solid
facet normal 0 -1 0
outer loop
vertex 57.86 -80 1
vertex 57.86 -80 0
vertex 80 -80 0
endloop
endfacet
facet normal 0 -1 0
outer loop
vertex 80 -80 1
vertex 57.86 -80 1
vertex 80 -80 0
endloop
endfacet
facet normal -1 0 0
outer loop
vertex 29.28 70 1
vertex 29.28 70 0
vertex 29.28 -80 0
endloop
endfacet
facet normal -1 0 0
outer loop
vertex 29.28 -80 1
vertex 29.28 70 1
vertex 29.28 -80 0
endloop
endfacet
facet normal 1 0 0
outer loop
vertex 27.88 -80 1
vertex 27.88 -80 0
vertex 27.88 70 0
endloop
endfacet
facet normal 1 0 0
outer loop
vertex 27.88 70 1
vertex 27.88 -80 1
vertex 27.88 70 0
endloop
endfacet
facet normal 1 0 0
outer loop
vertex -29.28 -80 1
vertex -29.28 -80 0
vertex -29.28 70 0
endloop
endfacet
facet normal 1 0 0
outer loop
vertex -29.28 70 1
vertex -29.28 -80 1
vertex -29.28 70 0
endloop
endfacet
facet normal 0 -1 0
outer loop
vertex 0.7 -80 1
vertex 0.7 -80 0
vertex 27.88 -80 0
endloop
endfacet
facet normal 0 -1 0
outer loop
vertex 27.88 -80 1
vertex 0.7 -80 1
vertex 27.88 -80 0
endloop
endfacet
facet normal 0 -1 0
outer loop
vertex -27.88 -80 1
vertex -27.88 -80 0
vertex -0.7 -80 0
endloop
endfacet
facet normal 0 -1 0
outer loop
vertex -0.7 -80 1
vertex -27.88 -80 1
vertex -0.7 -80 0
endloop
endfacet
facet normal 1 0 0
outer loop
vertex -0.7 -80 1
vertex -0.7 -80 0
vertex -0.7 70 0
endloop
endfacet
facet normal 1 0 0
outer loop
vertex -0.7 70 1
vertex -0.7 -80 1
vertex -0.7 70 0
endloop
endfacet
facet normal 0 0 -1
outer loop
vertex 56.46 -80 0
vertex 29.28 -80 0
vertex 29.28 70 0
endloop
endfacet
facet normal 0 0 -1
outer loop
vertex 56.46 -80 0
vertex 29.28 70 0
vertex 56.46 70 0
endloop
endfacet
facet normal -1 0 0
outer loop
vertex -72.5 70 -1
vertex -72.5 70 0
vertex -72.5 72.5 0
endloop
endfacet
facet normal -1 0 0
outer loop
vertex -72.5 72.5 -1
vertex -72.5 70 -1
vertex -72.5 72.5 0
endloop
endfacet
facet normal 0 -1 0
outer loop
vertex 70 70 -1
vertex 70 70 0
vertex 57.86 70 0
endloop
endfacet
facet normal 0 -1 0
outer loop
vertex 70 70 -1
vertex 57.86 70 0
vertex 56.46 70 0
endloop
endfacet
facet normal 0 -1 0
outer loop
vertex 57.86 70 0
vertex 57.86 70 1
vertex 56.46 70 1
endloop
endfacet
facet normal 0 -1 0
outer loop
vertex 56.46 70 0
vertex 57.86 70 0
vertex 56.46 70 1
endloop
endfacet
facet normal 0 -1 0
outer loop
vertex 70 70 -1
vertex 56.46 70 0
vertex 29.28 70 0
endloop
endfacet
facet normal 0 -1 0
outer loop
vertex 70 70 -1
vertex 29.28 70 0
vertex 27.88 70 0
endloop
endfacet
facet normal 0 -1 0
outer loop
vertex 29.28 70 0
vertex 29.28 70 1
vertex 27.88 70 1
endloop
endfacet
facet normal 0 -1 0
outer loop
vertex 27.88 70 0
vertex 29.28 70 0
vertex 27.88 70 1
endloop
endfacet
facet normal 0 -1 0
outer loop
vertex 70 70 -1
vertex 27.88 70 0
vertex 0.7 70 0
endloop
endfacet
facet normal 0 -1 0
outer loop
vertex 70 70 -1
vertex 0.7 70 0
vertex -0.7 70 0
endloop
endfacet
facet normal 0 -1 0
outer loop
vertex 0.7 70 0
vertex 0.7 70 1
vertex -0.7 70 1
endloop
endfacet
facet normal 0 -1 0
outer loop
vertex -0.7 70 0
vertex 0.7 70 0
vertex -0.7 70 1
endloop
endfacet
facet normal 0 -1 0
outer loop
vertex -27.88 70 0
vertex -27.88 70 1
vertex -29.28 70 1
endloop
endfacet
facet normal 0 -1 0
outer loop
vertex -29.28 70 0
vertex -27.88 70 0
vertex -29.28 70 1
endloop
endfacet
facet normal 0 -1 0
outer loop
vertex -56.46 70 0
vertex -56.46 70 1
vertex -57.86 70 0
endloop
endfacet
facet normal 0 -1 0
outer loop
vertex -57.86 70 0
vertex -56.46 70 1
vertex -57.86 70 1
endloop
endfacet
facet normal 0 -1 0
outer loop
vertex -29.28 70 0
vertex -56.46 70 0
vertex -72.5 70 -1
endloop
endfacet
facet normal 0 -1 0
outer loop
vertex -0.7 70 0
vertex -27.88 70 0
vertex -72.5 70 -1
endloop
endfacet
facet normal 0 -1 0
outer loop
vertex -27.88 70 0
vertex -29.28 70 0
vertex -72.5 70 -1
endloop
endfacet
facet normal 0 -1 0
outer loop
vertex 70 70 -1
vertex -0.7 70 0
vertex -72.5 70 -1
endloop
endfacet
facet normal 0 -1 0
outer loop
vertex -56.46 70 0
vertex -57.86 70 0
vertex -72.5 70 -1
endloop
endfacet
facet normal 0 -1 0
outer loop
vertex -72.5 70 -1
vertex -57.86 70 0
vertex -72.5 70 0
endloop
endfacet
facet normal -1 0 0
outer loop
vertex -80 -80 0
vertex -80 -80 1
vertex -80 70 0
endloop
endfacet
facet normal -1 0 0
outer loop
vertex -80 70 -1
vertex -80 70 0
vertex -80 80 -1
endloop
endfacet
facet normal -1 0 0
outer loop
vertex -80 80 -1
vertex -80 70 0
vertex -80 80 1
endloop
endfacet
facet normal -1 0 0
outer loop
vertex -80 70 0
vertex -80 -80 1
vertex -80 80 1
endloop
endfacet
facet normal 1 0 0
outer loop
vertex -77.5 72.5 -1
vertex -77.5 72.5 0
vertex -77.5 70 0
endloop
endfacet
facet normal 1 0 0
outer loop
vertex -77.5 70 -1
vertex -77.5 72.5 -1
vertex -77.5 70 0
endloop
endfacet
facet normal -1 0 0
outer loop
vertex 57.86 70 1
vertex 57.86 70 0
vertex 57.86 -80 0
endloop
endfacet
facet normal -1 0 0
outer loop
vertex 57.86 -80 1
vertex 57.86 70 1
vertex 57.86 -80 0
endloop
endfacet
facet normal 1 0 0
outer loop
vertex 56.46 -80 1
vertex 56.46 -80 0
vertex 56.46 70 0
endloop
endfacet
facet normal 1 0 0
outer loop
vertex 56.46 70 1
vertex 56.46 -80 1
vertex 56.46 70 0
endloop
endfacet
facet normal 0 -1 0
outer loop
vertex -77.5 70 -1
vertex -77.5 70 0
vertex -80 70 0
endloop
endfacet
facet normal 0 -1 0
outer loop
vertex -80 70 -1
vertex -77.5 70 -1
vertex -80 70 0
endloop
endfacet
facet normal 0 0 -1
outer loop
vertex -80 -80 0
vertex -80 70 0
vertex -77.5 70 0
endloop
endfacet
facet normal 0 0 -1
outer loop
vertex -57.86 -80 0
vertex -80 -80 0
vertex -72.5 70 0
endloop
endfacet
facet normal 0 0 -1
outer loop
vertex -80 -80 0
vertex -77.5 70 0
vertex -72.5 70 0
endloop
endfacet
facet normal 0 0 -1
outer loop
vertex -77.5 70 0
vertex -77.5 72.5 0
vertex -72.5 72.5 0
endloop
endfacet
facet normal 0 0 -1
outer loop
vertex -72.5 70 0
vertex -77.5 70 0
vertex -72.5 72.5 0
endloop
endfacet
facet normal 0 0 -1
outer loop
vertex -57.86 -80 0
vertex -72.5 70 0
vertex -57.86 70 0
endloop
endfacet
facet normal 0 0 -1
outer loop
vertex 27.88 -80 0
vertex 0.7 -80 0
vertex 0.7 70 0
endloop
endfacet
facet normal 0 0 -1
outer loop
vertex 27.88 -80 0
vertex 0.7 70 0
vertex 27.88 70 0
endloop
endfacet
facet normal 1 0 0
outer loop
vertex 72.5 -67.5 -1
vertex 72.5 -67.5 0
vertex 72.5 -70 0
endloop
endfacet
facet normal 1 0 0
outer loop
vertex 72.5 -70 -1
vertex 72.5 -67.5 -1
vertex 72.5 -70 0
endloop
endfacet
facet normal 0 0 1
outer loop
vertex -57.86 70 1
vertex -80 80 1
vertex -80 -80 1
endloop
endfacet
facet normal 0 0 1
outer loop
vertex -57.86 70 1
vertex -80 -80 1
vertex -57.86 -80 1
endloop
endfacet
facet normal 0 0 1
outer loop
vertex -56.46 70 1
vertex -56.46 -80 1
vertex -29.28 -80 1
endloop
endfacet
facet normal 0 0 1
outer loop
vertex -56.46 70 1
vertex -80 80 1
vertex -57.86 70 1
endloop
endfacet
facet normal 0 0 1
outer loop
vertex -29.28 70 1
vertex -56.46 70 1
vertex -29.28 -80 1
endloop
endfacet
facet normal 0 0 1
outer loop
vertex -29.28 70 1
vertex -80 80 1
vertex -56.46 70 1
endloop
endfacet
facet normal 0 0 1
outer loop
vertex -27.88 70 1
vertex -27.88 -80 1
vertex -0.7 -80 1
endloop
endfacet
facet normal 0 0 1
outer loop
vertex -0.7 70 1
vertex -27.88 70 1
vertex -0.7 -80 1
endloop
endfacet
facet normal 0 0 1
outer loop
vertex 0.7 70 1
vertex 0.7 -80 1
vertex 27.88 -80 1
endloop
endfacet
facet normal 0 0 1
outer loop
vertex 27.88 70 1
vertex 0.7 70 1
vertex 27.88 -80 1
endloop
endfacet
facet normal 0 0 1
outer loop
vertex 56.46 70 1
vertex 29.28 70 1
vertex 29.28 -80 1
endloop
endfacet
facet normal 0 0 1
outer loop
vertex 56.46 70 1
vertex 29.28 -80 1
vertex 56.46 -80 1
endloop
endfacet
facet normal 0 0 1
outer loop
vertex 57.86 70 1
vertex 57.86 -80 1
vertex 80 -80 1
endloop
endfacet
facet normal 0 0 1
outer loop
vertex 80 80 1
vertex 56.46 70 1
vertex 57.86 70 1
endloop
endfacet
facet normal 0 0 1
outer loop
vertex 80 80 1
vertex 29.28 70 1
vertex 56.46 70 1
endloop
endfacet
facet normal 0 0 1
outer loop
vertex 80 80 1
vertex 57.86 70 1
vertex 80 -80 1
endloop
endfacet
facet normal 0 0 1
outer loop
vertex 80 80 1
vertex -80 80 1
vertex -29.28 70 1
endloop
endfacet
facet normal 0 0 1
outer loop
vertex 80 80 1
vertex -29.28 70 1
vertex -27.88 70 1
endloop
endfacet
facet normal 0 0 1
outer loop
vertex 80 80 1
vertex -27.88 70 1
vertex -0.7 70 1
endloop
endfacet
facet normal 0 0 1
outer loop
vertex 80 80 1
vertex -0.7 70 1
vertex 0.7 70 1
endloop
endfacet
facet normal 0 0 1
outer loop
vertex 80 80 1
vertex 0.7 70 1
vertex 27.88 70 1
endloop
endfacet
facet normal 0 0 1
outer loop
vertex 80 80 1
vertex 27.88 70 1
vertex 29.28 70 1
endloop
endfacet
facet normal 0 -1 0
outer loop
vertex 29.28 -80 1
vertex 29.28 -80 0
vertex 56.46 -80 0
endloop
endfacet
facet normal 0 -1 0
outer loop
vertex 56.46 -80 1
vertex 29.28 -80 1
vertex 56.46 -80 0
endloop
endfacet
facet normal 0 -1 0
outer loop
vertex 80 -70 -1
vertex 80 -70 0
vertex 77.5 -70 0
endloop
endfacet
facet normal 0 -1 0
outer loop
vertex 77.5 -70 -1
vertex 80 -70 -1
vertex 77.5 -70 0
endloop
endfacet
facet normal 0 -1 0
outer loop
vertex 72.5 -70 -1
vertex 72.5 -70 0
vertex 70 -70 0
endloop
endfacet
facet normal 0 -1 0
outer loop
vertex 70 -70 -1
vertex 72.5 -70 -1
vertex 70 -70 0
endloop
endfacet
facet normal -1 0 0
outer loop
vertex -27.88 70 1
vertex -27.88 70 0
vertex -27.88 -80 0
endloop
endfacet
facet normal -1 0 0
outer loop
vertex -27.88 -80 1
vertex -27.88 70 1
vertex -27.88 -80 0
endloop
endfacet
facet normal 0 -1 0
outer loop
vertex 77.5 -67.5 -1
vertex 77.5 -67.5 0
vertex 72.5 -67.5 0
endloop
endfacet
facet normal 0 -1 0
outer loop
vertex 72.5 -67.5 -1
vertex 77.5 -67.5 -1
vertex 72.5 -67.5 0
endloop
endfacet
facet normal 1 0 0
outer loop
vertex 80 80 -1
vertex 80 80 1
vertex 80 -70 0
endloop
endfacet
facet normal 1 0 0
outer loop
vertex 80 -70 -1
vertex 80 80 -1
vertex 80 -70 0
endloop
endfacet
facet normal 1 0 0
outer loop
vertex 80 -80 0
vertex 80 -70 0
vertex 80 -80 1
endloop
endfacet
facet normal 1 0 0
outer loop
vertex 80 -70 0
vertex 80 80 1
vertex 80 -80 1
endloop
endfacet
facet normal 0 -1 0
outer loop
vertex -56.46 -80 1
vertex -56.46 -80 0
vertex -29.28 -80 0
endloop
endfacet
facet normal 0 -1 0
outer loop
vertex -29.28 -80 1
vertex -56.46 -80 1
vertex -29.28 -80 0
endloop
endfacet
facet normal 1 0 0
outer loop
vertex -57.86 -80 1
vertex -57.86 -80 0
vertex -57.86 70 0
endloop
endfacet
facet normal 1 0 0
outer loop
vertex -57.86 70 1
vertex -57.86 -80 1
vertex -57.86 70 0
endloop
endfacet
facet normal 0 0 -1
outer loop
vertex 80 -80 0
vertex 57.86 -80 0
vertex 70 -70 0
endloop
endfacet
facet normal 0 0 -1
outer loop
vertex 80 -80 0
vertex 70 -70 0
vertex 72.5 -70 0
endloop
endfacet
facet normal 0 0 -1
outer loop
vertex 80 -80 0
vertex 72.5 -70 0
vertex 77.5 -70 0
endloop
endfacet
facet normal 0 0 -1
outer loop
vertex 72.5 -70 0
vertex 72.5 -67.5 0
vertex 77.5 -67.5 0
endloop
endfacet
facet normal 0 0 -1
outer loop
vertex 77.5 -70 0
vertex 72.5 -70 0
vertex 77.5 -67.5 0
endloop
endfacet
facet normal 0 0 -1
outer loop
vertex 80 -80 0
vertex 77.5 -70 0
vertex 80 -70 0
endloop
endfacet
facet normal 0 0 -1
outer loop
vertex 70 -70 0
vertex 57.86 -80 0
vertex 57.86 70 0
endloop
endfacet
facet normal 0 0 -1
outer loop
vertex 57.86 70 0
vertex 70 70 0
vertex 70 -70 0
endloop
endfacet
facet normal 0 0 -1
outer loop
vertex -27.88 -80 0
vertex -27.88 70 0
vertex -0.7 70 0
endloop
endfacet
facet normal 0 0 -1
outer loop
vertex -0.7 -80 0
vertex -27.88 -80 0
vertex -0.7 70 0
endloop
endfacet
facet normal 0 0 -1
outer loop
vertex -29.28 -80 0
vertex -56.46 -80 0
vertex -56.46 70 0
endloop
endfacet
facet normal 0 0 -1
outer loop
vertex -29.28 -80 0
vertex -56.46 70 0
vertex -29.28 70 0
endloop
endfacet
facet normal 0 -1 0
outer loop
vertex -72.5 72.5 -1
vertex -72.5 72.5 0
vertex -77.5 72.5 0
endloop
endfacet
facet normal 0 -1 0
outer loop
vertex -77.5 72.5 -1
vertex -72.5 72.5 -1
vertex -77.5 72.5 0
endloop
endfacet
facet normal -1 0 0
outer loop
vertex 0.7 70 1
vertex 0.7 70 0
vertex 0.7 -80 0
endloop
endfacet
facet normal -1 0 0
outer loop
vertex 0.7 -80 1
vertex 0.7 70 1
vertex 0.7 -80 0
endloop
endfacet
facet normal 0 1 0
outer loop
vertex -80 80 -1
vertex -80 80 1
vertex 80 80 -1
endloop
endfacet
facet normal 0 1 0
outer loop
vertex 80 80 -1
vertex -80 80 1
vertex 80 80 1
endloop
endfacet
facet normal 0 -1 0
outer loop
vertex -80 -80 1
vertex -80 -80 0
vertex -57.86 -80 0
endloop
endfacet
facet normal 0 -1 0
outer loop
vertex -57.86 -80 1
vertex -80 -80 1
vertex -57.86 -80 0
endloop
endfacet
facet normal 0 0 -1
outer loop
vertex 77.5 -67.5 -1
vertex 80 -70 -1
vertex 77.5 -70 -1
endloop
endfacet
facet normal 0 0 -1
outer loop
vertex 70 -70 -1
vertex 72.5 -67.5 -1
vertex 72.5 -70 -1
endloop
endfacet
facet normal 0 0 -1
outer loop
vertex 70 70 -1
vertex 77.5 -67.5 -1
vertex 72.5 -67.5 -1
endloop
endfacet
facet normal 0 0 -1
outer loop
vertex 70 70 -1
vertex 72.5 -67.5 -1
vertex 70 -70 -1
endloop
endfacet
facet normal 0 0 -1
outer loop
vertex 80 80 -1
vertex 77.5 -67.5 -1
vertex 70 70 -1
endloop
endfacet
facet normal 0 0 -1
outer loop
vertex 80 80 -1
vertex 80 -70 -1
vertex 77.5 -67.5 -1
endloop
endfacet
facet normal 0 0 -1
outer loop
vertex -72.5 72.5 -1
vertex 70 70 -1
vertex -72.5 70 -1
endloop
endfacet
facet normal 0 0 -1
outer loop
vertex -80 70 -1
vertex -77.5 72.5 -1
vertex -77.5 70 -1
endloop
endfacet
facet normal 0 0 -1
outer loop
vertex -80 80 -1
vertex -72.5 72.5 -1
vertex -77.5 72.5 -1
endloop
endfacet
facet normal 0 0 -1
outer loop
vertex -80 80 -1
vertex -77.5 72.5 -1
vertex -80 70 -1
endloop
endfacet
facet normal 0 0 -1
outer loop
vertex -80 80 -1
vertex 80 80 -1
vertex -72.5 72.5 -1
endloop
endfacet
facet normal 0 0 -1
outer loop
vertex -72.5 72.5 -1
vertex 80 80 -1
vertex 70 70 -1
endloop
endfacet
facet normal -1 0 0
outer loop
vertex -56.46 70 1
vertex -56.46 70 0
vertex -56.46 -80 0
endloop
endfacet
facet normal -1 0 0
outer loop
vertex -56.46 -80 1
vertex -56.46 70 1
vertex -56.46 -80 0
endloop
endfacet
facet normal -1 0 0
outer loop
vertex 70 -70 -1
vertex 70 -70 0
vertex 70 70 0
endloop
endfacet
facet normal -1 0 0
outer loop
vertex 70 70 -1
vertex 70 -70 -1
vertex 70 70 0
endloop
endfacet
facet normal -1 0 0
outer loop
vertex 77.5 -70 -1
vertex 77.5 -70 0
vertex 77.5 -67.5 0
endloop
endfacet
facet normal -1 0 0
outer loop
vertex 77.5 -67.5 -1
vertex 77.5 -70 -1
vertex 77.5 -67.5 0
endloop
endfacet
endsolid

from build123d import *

# Parameters (mm, degrees)
EXTRUDE_2_DEPTH = 1
EXTRUDE_3_DEPTH = 1


with BuildPart() as part:
    # 草图1 → 凸台-拉伸2 (new body)
    with BuildSketch(Plane.XY):
        Polygon((-57.86, -80), (-57.86, 70), (-56.46, 70), (-56.46, -80), (-34.28, -80), (-29.28, -80), (-29.28, 70), (-27.88, 70), (-27.88, -80), (-5.7, -80), (-0.7, -80), (-0.7, 70), (0.7, 70), (0.7, -80), (22.88, -80), (27.88, -80), (27.88, 70), (29.28, 70), (29.28, -80), (51.46, -80), (56.46, -80), (56.46, 70), (57.86, 70), (57.86, -80), (80, -80), (80, 80), (-80, 80), (-80, -80), (-62.86, -80), align=None)
    extrude(amount=EXTRUDE_2_DEPTH)

    # 草图2 → 凸台-拉伸3 (add)
    with BuildSketch(Plane(origin=(0, 0, 0), x_dir=(-1, 0, 0), z_dir=(0, 0, -1))):
        Polygon((-80, -70), (-77.5, -70), (-77.5, -67.5), (-72.5, -67.5), (-72.5, -70), (-70, -70), (-70, 70), (72.5, 70), (72.5, 72.5), (77.5, 72.5), (77.5, 70), (80, 70), (80, 80), (-80, 80), align=None)
    extrude(amount=EXTRUDE_3_DEPTH)


solid = part.part
